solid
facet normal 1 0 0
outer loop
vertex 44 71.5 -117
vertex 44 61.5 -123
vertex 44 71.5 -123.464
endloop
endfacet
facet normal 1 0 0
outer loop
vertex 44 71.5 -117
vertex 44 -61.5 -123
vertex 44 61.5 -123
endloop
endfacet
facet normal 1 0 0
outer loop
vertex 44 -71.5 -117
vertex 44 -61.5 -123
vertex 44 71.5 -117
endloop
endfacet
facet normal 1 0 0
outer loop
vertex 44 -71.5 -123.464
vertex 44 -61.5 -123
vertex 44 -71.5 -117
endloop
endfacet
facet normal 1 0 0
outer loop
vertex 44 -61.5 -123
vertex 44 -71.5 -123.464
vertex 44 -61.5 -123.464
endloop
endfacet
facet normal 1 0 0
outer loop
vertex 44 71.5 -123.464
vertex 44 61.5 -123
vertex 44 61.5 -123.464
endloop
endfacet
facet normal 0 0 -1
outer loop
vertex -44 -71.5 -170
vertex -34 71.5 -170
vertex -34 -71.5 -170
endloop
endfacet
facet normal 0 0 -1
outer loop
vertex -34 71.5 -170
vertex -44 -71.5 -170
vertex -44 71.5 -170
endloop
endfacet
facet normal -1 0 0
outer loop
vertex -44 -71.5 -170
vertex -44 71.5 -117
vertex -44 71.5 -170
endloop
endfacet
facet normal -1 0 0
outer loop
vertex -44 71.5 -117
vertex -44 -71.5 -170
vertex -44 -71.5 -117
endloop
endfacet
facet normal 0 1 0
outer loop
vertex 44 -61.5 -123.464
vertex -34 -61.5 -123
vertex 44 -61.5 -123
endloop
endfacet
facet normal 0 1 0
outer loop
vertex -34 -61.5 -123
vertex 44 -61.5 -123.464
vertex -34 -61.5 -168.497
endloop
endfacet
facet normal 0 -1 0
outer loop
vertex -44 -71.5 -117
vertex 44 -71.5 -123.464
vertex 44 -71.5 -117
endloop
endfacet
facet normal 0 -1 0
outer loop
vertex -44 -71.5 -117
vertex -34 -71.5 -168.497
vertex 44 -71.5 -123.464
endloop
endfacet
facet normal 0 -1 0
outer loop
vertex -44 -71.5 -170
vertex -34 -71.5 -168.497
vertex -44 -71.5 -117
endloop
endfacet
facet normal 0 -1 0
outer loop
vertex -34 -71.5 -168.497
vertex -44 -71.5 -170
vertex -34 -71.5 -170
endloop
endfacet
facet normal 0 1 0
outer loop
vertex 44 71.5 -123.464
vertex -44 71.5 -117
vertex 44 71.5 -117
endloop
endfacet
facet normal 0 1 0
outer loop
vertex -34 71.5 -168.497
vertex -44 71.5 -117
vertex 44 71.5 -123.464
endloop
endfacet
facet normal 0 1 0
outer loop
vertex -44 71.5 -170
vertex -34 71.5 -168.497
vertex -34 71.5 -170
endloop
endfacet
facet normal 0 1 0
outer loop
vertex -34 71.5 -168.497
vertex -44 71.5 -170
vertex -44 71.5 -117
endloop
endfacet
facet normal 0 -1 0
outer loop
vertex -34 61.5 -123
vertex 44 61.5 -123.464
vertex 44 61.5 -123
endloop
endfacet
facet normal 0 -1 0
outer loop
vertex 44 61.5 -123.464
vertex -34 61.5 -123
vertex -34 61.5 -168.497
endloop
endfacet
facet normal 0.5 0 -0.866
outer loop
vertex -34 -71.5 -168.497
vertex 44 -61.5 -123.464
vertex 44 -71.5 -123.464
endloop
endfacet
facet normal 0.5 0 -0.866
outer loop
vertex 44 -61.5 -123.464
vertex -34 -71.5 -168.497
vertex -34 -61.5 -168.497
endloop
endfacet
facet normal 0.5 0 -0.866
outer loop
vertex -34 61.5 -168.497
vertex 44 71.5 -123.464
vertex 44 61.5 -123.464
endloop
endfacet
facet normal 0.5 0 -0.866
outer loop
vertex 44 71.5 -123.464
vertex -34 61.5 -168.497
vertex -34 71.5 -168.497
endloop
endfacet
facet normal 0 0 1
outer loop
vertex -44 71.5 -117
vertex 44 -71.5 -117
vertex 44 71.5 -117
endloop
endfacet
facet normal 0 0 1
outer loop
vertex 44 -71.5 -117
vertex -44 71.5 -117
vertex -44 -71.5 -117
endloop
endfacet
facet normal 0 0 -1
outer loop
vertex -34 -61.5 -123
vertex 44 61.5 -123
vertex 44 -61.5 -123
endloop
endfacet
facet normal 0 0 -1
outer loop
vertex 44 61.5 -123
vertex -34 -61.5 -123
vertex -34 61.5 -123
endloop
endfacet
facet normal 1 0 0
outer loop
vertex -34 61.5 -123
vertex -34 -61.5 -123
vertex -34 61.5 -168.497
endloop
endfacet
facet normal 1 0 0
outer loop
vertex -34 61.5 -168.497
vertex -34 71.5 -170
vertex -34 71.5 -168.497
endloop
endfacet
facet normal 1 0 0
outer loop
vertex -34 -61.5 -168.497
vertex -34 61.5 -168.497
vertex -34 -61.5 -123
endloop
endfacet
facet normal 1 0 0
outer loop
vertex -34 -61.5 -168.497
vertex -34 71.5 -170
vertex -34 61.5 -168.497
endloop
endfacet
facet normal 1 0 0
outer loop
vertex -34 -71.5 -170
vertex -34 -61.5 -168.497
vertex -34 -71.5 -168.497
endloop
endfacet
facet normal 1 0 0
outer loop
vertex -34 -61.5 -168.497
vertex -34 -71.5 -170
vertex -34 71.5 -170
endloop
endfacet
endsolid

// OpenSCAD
$fn = 90;

width = 88;
depth = 143;
height = 230;

//#speaker();
translate([0, 0, -120]) stand();

module speaker() {
    cube([width, depth, height], true);
}

module stand() {
    cube([width, depth, 6], true);
    translate([-width/2 +5, 0, -25]) cube([10, depth, 50], true);
    
    difference(){
        translate([0, 0, -25]) {
            translate([0, -66.5, 0]) cube([width, 10, 50], true);
            translate([0, 66.5, 0]) cube([width, 10, 50], true);
        }
        rotate([0, -30, 0]) translate([-10, 0, -50]) cube([width+10, depth+10, 50], true);
    }
}
